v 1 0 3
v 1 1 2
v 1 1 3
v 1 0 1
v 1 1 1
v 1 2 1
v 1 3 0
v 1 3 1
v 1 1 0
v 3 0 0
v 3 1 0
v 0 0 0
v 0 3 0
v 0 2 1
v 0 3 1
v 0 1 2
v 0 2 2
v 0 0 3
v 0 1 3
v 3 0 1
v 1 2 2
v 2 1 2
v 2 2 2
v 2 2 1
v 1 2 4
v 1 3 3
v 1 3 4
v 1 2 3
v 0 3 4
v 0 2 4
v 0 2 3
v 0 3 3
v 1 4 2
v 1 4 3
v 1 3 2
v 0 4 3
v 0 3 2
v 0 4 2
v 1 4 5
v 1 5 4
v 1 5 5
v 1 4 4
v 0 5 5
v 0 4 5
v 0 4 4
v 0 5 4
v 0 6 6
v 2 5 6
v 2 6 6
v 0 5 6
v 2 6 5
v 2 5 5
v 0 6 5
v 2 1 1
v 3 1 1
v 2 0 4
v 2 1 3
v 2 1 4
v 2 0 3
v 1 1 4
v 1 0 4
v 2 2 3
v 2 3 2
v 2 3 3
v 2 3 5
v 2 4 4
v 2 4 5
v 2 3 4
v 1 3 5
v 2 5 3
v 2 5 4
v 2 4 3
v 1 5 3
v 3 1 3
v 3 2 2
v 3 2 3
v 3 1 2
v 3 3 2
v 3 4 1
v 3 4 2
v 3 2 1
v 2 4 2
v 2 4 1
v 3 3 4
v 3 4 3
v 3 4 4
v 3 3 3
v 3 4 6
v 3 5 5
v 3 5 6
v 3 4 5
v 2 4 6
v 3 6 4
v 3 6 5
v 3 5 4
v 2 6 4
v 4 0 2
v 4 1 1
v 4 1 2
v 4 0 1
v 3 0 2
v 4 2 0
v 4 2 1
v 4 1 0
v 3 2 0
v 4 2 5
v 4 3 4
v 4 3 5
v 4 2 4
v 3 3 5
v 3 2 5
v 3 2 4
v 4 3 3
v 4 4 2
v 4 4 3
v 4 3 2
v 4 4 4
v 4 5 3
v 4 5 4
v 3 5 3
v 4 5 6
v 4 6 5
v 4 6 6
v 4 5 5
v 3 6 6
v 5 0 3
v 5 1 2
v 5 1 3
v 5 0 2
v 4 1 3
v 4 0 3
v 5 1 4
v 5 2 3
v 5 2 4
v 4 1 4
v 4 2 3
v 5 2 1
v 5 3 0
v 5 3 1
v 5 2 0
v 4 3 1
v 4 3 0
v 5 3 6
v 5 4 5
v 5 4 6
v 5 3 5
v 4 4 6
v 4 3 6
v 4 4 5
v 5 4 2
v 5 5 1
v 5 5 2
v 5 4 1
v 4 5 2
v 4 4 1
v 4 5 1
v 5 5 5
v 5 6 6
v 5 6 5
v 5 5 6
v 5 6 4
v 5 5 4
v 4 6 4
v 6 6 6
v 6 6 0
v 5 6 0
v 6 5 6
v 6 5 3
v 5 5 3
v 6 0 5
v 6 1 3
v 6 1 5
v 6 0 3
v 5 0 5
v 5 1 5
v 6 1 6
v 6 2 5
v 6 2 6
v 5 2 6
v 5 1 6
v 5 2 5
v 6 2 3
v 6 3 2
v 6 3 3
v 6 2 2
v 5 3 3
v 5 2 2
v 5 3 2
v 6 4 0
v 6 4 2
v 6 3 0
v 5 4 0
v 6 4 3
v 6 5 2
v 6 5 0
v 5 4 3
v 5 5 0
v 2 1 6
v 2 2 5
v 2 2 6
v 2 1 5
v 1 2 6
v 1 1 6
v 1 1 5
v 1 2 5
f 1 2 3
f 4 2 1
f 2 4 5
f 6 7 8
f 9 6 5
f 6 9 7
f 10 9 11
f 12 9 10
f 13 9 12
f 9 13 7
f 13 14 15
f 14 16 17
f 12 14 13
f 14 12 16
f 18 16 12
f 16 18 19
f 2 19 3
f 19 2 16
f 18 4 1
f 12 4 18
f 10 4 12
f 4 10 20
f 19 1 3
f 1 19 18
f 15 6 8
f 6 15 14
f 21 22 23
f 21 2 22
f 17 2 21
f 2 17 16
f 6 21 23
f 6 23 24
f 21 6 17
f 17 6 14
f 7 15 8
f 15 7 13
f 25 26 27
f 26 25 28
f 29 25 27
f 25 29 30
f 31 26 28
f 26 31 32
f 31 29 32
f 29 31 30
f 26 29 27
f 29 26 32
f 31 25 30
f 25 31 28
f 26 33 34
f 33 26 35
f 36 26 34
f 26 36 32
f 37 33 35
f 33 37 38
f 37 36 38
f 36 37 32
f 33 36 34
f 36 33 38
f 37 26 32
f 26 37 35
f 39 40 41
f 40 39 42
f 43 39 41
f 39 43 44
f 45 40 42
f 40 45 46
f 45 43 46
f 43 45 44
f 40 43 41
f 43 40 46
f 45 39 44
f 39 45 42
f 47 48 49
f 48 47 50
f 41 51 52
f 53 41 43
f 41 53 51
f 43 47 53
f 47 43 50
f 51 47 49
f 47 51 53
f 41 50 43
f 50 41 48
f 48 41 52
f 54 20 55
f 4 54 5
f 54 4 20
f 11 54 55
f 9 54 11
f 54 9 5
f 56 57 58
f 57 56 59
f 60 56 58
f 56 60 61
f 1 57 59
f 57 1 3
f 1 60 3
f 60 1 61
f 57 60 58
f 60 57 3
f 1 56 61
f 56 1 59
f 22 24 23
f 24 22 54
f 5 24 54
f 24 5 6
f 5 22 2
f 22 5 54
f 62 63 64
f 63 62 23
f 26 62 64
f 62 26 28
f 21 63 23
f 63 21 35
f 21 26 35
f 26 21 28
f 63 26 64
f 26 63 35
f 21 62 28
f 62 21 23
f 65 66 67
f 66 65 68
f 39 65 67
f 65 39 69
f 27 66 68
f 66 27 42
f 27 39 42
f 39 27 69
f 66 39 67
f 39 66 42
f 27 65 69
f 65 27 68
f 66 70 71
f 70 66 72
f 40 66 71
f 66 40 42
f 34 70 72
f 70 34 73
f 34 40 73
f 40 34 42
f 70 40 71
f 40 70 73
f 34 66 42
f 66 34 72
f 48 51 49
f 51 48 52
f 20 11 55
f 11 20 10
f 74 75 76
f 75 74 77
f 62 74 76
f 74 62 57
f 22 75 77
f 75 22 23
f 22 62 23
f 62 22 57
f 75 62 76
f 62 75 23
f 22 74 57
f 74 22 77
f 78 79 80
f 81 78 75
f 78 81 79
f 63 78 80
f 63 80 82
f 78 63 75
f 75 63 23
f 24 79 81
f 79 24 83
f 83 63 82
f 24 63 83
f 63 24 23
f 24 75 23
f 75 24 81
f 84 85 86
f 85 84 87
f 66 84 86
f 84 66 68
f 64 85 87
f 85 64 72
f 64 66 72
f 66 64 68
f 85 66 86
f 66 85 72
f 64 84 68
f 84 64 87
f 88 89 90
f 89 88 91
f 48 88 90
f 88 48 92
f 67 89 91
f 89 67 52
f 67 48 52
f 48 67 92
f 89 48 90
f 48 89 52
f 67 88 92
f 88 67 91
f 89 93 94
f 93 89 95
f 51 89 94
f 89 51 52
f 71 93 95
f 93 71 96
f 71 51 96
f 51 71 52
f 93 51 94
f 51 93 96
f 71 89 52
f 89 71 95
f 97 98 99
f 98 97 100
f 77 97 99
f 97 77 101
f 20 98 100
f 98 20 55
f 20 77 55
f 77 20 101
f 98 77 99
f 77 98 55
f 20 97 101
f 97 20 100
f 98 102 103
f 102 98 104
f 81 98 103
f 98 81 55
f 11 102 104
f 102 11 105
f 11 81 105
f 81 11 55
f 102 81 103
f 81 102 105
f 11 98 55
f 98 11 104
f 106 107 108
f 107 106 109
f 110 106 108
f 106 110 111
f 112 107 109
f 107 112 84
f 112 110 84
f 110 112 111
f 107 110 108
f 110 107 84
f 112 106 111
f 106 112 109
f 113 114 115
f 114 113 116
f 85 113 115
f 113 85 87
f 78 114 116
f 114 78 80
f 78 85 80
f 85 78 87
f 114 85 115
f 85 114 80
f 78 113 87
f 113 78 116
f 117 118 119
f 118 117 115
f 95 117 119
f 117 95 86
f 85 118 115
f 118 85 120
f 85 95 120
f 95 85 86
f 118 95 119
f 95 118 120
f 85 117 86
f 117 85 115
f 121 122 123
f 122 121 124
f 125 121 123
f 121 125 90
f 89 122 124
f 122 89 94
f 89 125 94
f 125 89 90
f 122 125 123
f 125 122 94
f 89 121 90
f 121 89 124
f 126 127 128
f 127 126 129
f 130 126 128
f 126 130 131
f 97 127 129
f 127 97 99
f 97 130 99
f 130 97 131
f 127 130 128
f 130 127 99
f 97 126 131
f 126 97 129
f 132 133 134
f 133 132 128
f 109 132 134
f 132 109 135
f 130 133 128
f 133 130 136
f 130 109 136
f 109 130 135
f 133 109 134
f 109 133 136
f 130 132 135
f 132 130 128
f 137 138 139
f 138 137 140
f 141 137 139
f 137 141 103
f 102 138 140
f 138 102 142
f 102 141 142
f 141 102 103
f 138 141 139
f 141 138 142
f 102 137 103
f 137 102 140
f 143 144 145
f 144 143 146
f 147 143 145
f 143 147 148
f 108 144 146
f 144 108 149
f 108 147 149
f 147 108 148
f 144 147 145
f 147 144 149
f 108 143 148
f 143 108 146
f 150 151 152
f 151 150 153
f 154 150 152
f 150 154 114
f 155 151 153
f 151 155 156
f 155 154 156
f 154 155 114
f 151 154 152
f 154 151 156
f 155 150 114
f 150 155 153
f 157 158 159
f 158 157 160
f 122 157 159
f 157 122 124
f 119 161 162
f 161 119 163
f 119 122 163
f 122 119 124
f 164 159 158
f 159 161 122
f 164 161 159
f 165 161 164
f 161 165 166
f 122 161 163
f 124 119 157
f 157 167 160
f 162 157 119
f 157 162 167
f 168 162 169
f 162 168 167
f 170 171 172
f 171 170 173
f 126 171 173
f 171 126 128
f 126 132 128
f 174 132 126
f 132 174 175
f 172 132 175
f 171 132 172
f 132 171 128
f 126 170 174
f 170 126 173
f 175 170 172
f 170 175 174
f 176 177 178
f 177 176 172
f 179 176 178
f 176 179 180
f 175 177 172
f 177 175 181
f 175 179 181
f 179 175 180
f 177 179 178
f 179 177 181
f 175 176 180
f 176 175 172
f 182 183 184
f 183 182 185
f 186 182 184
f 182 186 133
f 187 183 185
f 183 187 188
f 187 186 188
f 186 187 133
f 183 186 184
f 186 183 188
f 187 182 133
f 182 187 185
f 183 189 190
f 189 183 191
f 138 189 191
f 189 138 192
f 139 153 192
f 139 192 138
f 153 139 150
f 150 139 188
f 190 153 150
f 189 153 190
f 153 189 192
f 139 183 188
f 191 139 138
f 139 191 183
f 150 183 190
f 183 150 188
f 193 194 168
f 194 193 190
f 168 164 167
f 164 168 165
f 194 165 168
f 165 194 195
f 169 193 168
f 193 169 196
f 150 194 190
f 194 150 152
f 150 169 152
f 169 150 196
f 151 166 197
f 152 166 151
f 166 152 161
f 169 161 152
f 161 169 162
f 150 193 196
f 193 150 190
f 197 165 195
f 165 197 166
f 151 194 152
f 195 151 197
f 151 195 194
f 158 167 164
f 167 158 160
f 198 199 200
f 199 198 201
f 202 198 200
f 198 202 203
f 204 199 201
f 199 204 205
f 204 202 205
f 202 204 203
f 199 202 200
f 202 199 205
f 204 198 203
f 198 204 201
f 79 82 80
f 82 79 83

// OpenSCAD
union() {
    translate([0, 0, 0]) cube([1, 1, 1]);
    translate([0, 0, 1]) cube([1, 1, 1]);
    translate([0, 0, 2]) cube([1, 1, 1]);
    translate([0, 1, 0]) cube([1, 1, 1]);
    translate([0, 1, 1]) cube([1, 1, 1]);
    translate([0, 2, 0]) cube([1, 1, 1]);
    translate([0, 2, 3]) cube([1, 1, 1]);
    translate([0, 3, 2]) cube([1, 1, 1]);
    translate([0, 4, 4]) cube([1, 1, 1]);
    translate([0, 5, 5]) cube([1, 1, 1]);
    translate([1, 0, 0]) cube([1, 1, 1]);
    translate([1, 0, 3]) cube([1, 1, 1]);
    translate([1, 1, 1]) cube([1, 1, 1]);
    translate([1, 2, 2]) cube([1, 1, 1]);
    translate([1, 3, 4]) cube([1, 1, 1]);
    translate([1, 4, 3]) cube([1, 1, 1]);
    translate([1, 5, 5]) cube([1, 1, 1]);
    translate([2, 0, 0]) cube([1, 1, 1]);
    translate([2, 1, 2]) cube([1, 1, 1]);
    translate([2, 2, 1]) cube([1, 1, 1]);
    translate([2, 3, 3]) cube([1, 1, 1]);
    translate([2, 4, 5]) cube([1, 1, 1]);
    translate([2, 5, 4]) cube([1, 1, 1]);
    translate([3, 0, 1]) cube([1, 1, 1]);
    translate([3, 1, 0]) cube([1, 1, 1]);
    translate([3, 2, 4]) cube([1, 1, 1]);
    translate([3, 3, 2]) cube([1, 1, 1]);
    translate([3, 4, 3]) cube([1, 1, 1]);
    translate([3, 5, 5]) cube([1, 1, 1]);
    translate([4, 0, 2]) cube([1, 1, 1]);
    translate([4, 1, 3]) cube([1, 1, 1]);
    translate([4, 2, 0]) cube([1, 1, 1]);
    translate([4, 3, 5]) cube([1, 1, 1]);
    translate([4, 4, 1]) cube([1, 1, 1]);
    translate([4, 5, 4]) cube([1, 1, 1]);
    translate([5, 0, 3]) cube([1, 1, 1]);
    translate([5, 0, 4]) cube([1, 1, 1]);
    translate([5, 1, 5]) cube([1, 1, 1]);
    translate([5, 2, 2]) cube([1, 1, 1]);
    translate([5, 3, 0]) cube([1, 1, 1]);
    translate([5, 3, 1]) cube([1, 1, 1]);
    translate([5, 4, 2]) cube([1, 1, 1]);
    translate([5, 5, 0]) cube([1, 1, 1]);
    translate([5, 5, 1]) cube([1, 1, 1]);
    translate([5, 5, 2]) cube([1, 1, 1]);
    translate([5, 5, 3]) cube([1, 1, 1]);
    translate([5, 5, 4]) cube([1, 1, 1]);
    translate([5, 5, 5]) cube([1, 1, 1]);
    translate([1, 1, 5]) cube([1, 1, 1]);
    translate([2, 3, 1]) cube([1, 1, 1]);
}
